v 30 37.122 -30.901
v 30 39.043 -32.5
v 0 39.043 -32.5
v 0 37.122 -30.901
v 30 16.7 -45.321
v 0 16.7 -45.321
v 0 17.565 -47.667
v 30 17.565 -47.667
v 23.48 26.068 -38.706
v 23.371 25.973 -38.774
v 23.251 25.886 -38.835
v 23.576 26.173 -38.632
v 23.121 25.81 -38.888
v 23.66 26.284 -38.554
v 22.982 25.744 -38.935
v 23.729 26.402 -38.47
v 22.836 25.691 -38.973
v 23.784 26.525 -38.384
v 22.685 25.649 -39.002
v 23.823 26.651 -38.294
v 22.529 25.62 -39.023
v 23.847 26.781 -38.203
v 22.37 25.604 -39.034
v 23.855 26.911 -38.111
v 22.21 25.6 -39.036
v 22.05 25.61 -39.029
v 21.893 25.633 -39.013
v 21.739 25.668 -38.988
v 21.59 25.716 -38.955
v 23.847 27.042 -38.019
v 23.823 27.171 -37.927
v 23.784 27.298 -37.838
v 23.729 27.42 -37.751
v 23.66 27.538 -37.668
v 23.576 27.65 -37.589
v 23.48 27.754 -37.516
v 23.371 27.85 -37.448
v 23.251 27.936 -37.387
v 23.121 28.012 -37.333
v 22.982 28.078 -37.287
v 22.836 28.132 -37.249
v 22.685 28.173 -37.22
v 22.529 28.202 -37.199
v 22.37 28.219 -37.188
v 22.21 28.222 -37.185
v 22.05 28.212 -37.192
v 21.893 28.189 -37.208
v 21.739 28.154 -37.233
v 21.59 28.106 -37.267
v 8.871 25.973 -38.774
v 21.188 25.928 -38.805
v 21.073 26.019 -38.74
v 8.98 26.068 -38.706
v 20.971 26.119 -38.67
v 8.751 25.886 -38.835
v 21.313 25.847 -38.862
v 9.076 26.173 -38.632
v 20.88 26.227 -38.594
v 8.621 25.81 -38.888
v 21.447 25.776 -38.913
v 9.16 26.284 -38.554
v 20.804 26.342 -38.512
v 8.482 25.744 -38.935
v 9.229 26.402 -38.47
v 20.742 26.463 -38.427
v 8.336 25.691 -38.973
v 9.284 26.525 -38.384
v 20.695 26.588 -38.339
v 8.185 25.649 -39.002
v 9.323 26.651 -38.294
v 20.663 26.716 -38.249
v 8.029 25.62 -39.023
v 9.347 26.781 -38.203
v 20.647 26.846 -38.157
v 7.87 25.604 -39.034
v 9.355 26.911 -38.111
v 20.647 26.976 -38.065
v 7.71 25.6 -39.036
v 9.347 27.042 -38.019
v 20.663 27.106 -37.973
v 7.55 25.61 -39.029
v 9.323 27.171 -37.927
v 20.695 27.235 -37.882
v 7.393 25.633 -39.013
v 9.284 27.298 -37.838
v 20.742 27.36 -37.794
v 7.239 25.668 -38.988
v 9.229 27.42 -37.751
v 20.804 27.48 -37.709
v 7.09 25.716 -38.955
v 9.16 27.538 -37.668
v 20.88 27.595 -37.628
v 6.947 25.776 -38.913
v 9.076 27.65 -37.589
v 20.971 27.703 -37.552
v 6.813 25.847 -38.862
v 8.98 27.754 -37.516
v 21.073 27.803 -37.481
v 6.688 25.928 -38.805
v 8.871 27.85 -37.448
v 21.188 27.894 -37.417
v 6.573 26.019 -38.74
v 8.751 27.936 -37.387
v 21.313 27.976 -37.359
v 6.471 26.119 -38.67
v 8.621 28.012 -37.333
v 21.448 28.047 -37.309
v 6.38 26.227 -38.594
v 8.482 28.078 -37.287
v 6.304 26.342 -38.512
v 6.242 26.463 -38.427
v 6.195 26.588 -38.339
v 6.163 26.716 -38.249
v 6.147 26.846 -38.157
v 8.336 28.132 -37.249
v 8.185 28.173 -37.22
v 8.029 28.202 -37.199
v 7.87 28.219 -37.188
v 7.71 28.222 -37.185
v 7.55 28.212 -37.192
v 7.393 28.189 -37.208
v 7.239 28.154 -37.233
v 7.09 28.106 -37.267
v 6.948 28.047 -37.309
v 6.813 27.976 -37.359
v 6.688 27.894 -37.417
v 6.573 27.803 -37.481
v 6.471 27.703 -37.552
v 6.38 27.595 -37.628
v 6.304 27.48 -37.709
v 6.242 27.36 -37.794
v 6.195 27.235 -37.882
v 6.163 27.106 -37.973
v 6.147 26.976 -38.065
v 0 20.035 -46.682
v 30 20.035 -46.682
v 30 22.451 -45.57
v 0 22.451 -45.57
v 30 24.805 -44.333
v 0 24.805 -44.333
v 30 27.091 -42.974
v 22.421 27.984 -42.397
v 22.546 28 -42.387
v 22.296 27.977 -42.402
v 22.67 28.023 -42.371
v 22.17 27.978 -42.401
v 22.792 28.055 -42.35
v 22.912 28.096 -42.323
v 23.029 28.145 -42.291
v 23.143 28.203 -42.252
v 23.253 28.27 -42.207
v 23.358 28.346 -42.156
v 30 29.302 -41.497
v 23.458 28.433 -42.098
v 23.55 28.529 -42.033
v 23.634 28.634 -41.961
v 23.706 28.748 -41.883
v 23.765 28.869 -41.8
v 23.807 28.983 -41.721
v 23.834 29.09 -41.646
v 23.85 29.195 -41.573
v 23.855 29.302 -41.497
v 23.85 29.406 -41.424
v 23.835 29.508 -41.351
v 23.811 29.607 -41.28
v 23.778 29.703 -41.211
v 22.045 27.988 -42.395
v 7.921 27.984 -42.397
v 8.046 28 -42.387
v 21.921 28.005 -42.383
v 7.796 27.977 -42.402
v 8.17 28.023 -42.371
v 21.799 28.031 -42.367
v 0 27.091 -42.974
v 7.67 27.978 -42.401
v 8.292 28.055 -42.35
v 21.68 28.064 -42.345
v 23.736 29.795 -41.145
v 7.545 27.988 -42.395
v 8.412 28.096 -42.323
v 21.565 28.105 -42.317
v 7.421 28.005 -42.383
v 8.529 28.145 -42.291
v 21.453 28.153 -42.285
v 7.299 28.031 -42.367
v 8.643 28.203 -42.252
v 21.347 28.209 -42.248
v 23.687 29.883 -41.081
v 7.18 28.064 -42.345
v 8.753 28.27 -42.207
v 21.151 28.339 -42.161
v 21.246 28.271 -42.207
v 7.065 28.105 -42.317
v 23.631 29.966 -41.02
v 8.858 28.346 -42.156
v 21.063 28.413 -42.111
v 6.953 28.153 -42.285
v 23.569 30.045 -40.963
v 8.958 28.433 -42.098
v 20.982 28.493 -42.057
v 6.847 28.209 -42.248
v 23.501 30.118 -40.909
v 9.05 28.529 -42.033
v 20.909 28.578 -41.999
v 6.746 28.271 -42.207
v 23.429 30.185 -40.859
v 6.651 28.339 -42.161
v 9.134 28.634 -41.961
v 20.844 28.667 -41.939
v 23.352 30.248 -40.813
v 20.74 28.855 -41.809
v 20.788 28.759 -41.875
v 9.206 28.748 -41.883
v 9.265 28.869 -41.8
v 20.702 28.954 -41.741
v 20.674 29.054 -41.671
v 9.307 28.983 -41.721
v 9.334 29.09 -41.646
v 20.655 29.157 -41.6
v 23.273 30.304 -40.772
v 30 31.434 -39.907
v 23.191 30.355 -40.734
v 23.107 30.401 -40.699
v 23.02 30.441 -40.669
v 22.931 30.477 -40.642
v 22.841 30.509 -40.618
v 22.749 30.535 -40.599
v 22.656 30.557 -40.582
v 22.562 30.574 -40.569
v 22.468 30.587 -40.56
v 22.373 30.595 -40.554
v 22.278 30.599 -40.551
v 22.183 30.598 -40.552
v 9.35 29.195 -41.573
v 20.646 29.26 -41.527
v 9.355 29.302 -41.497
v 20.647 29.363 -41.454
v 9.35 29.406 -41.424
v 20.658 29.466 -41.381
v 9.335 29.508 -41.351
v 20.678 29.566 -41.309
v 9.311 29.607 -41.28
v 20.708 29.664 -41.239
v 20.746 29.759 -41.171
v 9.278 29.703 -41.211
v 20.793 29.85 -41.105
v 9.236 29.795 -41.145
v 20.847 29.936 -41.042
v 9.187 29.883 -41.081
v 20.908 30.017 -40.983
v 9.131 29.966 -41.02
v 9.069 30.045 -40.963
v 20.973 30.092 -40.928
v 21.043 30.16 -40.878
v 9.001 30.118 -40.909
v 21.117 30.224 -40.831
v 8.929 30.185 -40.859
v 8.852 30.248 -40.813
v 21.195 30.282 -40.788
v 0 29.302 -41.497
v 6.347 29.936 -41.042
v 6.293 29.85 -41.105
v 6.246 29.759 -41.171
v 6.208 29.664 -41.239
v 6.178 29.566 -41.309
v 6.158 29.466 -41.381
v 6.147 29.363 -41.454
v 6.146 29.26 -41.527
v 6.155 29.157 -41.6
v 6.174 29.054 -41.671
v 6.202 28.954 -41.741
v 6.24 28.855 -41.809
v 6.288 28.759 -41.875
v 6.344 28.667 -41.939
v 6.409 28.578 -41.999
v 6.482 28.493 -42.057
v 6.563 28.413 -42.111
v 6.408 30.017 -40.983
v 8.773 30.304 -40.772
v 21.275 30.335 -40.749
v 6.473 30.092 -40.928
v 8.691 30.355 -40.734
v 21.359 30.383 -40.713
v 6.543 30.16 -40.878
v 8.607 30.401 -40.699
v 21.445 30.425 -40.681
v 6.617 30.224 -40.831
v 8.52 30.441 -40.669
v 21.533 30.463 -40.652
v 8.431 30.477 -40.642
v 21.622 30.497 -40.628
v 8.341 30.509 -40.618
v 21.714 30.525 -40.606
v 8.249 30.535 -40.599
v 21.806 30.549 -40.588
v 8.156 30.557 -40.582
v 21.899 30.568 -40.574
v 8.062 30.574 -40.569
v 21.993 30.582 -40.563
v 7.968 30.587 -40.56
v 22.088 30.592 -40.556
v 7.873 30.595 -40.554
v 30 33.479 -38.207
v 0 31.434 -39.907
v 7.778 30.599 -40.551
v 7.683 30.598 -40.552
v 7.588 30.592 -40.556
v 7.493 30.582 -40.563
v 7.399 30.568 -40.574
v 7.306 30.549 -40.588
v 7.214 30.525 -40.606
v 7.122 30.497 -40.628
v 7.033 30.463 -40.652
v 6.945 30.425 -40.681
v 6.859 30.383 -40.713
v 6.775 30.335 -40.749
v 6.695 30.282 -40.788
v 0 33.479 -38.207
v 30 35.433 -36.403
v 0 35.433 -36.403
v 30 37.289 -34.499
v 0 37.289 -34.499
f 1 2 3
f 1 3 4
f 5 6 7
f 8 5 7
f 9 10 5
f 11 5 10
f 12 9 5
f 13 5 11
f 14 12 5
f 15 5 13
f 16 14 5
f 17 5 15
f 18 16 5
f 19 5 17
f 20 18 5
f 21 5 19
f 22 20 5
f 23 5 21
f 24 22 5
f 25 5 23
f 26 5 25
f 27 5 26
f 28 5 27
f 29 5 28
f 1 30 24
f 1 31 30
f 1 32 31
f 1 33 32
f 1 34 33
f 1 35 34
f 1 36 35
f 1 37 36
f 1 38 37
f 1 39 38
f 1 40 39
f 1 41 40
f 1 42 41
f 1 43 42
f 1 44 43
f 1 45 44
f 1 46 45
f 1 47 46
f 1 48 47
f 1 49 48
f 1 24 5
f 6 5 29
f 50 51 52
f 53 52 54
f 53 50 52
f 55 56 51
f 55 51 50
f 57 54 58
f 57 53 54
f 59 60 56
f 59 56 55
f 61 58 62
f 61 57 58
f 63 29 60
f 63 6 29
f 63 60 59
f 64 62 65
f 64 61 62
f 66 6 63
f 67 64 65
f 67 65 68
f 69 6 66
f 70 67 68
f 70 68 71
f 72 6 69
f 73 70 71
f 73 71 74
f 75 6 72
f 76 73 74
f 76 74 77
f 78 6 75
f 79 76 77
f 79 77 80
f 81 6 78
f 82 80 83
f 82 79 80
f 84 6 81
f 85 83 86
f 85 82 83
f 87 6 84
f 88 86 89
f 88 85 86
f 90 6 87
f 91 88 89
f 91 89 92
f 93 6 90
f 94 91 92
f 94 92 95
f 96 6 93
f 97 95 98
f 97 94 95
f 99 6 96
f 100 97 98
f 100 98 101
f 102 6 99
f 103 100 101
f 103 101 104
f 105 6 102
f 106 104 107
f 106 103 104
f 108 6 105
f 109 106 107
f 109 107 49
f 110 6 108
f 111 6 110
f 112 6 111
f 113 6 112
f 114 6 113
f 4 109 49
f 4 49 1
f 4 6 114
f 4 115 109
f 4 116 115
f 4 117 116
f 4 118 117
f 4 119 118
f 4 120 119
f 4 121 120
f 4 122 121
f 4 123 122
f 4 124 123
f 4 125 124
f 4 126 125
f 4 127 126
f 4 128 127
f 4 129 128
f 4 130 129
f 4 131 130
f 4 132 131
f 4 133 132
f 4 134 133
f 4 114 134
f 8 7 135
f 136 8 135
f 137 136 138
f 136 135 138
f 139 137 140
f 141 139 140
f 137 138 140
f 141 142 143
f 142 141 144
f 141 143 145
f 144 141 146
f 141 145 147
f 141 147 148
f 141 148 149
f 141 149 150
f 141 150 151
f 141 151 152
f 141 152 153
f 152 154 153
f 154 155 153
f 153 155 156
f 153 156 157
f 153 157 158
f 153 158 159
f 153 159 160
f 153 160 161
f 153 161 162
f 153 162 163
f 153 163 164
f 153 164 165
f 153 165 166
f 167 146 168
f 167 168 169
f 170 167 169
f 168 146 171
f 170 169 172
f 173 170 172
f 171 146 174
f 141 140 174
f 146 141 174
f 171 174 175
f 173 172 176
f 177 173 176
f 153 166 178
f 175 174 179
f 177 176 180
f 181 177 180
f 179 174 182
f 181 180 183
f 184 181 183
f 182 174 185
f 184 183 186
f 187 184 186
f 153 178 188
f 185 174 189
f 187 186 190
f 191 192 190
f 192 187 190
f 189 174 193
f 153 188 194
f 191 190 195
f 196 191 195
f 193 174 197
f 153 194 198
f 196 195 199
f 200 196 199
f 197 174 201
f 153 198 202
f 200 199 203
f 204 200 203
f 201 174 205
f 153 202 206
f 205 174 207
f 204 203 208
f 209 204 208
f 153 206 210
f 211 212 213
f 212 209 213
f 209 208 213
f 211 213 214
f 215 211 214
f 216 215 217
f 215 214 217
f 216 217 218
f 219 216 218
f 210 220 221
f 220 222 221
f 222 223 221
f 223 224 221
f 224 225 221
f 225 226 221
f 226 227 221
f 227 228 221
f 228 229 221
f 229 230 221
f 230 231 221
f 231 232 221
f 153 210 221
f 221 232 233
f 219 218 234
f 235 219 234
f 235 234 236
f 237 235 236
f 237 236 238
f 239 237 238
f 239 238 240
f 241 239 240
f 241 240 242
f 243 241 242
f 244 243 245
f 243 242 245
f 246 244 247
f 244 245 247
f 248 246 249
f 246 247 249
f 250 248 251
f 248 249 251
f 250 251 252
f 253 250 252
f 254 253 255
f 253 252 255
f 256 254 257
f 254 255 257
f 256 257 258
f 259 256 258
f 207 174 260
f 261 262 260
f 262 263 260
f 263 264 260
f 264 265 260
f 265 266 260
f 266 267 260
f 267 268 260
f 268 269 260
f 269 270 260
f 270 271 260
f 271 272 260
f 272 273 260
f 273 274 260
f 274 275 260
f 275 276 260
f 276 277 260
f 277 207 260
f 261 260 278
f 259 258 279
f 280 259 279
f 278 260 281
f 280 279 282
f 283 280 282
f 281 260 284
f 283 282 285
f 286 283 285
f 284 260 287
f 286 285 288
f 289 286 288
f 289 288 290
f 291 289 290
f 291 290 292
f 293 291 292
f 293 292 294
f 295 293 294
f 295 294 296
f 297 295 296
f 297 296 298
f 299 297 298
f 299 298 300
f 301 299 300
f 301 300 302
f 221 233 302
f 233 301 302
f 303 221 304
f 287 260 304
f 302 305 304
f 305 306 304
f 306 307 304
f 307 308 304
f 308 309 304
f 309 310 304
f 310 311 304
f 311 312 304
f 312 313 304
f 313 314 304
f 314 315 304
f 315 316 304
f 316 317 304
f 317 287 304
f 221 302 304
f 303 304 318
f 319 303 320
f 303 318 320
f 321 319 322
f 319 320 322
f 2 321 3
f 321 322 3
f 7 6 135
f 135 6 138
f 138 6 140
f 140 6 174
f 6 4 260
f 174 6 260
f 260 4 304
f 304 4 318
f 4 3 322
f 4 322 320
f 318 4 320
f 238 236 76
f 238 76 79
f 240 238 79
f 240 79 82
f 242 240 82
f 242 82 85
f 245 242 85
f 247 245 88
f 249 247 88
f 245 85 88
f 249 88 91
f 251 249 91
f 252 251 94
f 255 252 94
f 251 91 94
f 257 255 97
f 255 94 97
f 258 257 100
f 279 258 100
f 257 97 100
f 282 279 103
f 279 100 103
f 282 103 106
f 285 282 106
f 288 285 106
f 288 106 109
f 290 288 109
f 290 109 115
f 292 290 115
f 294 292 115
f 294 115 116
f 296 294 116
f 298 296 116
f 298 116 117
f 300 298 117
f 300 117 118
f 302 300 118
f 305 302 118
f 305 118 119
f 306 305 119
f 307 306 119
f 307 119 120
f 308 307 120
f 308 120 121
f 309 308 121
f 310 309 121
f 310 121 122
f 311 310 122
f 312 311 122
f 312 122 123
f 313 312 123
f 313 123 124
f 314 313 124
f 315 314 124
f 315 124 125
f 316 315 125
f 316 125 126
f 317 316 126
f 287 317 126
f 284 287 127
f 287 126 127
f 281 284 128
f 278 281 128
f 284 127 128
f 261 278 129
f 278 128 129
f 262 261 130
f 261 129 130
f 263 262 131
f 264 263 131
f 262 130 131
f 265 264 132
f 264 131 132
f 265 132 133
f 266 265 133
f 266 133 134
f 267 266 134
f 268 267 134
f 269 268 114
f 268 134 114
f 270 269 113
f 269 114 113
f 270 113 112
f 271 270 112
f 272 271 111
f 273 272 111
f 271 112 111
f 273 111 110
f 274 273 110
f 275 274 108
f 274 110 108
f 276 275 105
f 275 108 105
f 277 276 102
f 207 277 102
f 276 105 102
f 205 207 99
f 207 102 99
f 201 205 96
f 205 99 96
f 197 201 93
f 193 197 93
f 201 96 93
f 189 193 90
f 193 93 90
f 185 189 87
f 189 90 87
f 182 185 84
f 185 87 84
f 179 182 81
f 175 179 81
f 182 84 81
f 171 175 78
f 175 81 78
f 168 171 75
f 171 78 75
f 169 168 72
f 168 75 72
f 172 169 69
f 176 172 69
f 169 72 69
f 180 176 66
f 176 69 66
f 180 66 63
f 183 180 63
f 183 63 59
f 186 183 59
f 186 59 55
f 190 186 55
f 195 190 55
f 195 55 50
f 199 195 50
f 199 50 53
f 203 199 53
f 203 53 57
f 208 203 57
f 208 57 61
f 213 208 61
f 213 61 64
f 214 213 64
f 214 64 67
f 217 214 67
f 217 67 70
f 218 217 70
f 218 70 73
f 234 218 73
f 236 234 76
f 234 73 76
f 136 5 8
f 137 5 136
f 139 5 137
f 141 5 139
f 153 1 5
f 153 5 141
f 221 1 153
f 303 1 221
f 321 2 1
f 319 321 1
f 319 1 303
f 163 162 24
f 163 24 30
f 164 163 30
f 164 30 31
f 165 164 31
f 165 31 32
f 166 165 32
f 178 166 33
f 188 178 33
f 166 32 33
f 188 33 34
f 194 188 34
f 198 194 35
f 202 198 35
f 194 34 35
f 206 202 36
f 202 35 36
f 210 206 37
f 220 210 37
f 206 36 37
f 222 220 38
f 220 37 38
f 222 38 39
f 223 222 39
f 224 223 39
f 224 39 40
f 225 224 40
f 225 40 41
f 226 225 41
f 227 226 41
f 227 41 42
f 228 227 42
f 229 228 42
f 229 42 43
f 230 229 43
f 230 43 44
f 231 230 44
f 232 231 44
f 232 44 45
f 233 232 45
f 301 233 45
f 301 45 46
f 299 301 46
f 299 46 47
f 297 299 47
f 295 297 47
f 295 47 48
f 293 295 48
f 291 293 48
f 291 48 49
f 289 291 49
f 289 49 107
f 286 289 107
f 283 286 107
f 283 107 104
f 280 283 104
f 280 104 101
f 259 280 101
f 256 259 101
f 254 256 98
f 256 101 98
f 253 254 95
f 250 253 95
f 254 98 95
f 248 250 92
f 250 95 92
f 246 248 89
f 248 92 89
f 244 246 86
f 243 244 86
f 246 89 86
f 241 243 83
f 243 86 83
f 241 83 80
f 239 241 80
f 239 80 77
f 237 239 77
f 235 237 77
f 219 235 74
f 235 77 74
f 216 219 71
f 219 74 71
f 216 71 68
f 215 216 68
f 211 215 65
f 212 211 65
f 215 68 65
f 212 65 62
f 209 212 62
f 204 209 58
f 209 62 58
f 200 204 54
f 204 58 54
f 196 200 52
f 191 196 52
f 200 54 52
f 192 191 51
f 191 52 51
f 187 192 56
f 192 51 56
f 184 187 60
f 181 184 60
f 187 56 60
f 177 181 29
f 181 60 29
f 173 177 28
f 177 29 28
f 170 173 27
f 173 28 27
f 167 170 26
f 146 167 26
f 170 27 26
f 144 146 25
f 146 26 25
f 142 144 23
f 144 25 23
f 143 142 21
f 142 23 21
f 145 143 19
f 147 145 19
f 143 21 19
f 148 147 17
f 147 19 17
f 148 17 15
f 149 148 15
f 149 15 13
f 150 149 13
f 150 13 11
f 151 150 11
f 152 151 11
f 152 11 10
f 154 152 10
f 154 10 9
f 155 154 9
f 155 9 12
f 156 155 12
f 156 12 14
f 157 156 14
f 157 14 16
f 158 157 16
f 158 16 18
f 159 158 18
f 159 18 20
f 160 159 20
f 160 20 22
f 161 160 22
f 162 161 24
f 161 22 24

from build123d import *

# Parameters (mm, degrees)
BOSS_EXTRUDE1_DEPTH = 30
CUT_EXTRUDE1_REACH  = 16.804
SKETCH4_R           = 1.605


with BuildPart() as part:
    # Sketch3 → Boss-Extrude1 (new body)
    with BuildSketch(Plane(origin=(0, 0, 0), x_dir=(0, 0, -1), z_dir=(1, 0, 0))):
        with BuildLine():
            ThreePointArc((47.666821582, 17.564570029), (41.497171662, 29.302299296), (32.5, 39.043437349))
            Line((32.5, 39.043437349), (30.900590551, 37.122008345))
            ThreePointArc((30.900590551, 37.122008345), (39.454988017, 27.860257008), (45.321013433, 16.700171897))
            Line((45.321013433, 16.700171897), (47.666821582, 17.564570029))
        make_face()
        with BuildLine():
            ThreePointArc((30.900590551, 37.122008345), (39.454988017, 27.860257008), (45.321013433, 16.700171897))
            Line((45.321013433, 16.700171897), (30.900590551, 37.122008345))
        make_face()
    extrude(amount=BOSS_EXTRUDE1_DEPTH)

    # Sketch4 → Cut-Extrude1 (cut, up to next)
    with BuildSketch(Plane(origin=(0, 26.911090121, -38.110801992), x_dir=(1, 0, 0), z_dir=(0, -0.576816915, 0.816873458)), mode=Mode.PRIVATE) as cut_extrude1_sk1:
        with Locations((7.75, 0)):
            Circle(SKETCH4_R)
    cut_extrude1_tool1 = extrude(cut_extrude1_sk1.sketch, amount=-CUT_EXTRUDE1_REACH, mode=Mode.PRIVATE) & part.part
    add(cut_extrude1_tool1.solids().sort_by_distance((7.75, 26.91109, -38.110802))[0], mode=Mode.SUBTRACT)
    # Sketch4 → Cut-Extrude1 (cut, up to next)
    with BuildSketch(Plane(origin=(0, 26.911090121, -38.110801992), x_dir=(1, 0, 0), z_dir=(0, -0.576816915, 0.816873458)), mode=Mode.PRIVATE) as cut_extrude1_sk2:
        with Locations((22.25, 0)):
            Circle(SKETCH4_R)
    cut_extrude1_tool2 = extrude(cut_extrude1_sk2.sketch, amount=-CUT_EXTRUDE1_REACH, mode=Mode.PRIVATE) & part.part
    add(cut_extrude1_tool2.solids().sort_by_distance((22.25, 26.91109, -38.110802))[0], mode=Mode.SUBTRACT)


solid = part.part
